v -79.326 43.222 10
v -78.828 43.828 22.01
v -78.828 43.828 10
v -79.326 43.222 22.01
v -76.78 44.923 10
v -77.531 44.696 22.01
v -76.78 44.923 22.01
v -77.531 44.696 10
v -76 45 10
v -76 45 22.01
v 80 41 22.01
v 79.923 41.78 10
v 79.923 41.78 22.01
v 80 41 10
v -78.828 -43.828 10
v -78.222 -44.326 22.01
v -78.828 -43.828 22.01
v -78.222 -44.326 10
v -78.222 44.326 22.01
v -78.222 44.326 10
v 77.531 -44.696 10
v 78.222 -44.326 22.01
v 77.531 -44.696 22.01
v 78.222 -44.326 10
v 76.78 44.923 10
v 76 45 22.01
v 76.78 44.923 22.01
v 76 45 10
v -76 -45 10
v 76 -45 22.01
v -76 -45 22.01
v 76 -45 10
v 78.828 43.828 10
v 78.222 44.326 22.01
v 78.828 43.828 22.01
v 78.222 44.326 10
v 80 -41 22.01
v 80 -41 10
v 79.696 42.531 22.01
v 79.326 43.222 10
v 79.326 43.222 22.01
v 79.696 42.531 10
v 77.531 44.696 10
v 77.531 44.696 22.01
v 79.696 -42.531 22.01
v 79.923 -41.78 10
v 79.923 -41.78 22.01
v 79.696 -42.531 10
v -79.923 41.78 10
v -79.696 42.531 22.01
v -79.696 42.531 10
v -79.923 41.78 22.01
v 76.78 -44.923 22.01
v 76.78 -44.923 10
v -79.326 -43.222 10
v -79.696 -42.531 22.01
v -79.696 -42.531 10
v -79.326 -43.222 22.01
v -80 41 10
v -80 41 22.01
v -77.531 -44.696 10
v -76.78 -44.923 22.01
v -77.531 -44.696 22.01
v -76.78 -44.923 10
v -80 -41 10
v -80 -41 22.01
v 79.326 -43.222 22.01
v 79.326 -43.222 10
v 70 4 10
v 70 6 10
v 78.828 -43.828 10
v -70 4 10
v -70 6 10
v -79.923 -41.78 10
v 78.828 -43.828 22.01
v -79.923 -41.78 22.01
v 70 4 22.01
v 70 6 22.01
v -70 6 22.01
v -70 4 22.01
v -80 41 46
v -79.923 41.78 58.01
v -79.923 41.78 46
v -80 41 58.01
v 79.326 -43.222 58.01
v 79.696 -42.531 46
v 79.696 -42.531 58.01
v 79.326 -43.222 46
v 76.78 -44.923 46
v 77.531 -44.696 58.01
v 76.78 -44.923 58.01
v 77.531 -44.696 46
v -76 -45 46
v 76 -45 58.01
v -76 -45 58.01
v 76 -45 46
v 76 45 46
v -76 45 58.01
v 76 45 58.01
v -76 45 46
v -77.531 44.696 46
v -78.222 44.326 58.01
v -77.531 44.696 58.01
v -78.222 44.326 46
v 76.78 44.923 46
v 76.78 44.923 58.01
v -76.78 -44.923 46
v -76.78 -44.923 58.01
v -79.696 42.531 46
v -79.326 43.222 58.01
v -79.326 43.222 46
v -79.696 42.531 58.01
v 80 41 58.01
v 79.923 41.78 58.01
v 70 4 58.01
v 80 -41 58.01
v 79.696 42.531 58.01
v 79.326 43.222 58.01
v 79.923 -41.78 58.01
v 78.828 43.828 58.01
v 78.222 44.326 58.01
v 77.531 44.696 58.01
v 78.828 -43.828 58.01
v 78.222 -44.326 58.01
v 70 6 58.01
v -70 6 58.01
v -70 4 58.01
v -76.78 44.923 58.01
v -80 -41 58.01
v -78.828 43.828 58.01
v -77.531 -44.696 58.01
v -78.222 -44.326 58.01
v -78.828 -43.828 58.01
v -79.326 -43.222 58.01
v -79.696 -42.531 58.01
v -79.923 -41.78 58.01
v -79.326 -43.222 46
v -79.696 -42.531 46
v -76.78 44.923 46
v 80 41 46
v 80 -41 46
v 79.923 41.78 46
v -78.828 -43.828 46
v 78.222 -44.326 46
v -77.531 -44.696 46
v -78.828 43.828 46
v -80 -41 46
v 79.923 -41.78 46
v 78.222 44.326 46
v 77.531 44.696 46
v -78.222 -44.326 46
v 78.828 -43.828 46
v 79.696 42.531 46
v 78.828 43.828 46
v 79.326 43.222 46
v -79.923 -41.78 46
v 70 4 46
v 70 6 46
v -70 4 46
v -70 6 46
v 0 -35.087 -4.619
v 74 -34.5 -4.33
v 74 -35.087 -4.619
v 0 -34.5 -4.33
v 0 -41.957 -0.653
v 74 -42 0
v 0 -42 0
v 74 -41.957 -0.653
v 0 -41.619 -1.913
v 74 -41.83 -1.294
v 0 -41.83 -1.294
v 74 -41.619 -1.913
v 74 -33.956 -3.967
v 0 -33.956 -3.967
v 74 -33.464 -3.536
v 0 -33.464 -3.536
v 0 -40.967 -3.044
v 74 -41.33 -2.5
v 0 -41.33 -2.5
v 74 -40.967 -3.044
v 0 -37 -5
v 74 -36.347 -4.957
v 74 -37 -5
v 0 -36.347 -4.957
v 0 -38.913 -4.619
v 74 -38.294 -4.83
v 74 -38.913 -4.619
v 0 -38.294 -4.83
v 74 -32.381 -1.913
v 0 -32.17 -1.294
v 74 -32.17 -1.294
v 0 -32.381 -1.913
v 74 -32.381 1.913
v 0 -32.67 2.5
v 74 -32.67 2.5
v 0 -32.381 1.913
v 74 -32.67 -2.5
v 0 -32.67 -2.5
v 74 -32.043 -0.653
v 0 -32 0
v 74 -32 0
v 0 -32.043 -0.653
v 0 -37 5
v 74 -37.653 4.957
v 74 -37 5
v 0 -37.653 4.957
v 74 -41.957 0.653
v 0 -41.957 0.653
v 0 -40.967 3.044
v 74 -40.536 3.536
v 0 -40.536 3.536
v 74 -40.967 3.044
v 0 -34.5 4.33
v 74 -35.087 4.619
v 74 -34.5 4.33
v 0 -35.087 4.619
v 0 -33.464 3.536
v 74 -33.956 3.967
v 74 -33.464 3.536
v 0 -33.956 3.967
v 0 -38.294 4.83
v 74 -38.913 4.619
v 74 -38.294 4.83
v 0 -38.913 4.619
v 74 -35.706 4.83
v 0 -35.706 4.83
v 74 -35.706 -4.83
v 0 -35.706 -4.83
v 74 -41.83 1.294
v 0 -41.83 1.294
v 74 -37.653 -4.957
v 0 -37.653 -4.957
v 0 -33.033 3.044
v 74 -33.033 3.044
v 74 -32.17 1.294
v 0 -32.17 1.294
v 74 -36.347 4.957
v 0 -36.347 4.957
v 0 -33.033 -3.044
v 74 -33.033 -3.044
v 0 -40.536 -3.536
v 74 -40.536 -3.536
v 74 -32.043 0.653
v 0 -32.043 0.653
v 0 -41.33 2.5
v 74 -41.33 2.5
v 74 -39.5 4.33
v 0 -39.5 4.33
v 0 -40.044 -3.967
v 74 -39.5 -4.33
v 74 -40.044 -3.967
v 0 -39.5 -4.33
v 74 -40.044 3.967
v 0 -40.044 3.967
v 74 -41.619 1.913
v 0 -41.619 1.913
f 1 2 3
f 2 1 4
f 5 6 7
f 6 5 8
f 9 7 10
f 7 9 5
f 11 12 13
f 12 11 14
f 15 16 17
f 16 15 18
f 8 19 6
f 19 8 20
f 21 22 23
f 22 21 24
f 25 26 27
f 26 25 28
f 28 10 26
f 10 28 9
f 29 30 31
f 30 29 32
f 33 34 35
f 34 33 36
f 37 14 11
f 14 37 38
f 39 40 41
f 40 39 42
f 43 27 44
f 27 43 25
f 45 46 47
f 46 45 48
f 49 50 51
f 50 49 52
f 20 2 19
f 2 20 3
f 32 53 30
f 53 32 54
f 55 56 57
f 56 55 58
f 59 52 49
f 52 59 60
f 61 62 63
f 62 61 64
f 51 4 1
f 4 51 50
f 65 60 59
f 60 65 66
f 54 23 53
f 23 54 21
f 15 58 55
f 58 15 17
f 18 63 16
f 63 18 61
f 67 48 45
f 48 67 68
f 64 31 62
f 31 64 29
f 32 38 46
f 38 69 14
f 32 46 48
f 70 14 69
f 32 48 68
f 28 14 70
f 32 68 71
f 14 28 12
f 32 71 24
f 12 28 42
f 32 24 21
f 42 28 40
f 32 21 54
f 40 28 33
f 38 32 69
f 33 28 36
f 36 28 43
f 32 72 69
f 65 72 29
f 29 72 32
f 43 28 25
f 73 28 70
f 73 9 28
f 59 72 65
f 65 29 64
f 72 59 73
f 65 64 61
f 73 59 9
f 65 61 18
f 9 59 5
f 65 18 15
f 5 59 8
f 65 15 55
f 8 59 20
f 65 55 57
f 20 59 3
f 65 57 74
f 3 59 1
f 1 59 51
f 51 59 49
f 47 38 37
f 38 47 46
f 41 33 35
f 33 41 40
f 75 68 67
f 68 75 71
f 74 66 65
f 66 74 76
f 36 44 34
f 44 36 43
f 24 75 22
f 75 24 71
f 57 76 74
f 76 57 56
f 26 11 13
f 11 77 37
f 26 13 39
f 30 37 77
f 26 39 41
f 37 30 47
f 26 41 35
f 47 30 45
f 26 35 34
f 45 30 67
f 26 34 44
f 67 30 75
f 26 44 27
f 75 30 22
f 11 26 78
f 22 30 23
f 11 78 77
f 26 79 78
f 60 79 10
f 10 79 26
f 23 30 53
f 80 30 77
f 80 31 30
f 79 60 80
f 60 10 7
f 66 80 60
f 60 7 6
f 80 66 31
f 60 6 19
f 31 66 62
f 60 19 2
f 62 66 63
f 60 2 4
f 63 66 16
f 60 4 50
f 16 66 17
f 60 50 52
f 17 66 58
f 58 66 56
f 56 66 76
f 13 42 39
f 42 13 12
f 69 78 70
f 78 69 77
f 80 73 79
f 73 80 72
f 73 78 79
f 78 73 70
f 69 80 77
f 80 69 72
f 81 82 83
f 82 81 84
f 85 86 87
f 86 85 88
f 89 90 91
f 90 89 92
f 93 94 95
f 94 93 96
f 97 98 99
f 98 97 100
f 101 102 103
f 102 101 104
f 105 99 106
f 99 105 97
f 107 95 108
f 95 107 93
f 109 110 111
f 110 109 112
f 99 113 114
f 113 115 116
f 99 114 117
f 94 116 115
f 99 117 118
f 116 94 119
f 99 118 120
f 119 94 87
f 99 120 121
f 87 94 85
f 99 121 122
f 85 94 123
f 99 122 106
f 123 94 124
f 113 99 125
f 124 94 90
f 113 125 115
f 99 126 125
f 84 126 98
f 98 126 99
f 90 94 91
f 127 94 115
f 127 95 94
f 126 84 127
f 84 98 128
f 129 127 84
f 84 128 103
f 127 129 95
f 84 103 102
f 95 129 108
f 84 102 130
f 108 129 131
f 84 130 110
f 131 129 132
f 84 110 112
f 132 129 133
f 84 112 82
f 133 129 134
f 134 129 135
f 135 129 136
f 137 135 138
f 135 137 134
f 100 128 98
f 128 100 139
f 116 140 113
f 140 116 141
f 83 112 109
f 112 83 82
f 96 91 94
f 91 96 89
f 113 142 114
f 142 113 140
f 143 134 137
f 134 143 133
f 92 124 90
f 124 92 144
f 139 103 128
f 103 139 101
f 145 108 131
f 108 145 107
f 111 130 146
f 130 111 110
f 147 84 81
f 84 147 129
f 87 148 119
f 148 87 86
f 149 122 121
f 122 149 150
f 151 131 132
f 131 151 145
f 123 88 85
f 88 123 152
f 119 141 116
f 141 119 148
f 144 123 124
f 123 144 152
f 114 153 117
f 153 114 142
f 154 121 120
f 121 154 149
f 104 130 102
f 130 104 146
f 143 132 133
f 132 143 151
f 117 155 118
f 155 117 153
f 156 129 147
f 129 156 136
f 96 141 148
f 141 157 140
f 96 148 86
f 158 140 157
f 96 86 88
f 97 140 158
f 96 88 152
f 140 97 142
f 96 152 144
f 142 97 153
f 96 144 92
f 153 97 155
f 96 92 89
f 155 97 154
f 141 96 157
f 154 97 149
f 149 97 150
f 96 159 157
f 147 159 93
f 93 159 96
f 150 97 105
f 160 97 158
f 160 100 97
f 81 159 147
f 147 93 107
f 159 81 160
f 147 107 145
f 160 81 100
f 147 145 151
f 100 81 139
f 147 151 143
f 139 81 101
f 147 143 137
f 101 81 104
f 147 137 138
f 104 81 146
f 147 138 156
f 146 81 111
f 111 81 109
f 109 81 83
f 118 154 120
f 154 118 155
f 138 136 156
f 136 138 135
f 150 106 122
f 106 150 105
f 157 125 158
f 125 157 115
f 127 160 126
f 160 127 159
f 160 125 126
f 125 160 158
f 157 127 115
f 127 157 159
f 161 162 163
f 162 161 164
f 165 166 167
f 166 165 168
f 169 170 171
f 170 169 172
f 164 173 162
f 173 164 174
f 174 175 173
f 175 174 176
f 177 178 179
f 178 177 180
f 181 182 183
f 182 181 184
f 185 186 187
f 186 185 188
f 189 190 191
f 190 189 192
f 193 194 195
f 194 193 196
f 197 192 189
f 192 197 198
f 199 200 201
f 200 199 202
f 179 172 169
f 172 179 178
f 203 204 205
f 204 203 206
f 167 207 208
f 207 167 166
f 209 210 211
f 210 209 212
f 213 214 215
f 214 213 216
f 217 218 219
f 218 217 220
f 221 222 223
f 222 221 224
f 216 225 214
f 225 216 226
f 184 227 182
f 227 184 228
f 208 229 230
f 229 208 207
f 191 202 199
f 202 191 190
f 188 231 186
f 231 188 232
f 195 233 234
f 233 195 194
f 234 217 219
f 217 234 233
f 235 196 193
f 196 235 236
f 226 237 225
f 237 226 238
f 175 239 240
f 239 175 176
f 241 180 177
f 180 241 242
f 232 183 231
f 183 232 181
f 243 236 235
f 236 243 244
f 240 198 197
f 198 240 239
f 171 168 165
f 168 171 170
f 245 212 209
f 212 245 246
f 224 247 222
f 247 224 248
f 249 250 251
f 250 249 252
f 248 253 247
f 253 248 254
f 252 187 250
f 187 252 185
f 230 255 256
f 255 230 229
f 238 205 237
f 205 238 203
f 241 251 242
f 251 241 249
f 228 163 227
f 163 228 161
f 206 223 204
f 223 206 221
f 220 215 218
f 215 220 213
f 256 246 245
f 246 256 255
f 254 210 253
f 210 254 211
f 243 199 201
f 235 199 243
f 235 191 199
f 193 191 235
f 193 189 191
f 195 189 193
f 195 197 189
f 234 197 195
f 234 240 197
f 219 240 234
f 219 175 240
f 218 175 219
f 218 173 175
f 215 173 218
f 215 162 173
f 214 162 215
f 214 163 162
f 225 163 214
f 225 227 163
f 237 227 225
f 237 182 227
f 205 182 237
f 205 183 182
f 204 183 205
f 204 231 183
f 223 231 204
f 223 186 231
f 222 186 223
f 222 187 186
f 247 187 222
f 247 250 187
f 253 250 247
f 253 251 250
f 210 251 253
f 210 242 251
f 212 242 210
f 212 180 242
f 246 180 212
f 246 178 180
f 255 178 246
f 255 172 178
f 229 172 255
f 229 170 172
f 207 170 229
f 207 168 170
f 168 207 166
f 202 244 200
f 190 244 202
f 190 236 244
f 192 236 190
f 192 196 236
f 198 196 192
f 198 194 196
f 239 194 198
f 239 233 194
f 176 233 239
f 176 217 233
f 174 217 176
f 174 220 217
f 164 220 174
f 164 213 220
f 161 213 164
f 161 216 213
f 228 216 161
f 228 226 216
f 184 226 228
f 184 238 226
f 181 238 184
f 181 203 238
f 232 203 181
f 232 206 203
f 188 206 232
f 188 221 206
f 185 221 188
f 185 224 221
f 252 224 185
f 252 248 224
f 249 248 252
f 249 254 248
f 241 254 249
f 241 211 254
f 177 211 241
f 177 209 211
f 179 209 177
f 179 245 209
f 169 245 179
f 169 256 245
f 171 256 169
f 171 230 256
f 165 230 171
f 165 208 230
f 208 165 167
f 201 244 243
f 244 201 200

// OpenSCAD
// file: ../common/ports.scad
module usb_c_cutout() {
  translate([0,0,-1]) cube([9, 3.5, wall+2], center=true);
}
module usb_a_cutout() {
  translate([0,0,-1]) cube([12, 5, wall+2], center=true);
}
module audio_3_5_cutout() {
  translate([0,0,-1]) cylinder(h=wall+2, d=6, $fn=32);
}
// file: ../common/dimensions.scad
// Shared dimensions — EVT-0 concept only
wall = 2;
corner_r = 4;
badge_w = 12;
badge_h = 3;
// main file
include <../common/dimensions.scad>
include <../common/ports.scad>

clamshell_l=160; clamshell_w=90; thickness=12;

module half(label_z) {
  difference() {
    translate([0,0,label_z]) minkowski() {
      cube([clamshell_l-2*corner_r, clamshell_w-2*corner_r, thickness], center=true);
      cylinder(r=corner_r, h=0.01, $fn=32);
    }
    // screen recess
    translate([0,5,label_z+thickness/2-1]) cube([clamshell_l-20, 2, clamshell_w-25], center=true);
  }
}

// hinge
translate([0,-clamshell_w/2+8,0]) rotate([0,90,0]) cylinder(h=clamshell_w-16, r=5, $fn=48);

difference() {
  union() {
    translate([0,0,thickness/2+2]) half(thickness/2+2);   // lower code screen
    translate([0,0,thickness*1.5+8]) half(thickness*1.5+8); // upper preview
  }
  translate([clamshell_l/2-4, -clamshell_w/2+10, thickness/2]) rotate([90,0,0]) usb_c_cutout();
  // pogo keyboard connector
  translate([0,-clamshell_w/2+4, thickness/2]) cube([50,2,2], center=true);
}
